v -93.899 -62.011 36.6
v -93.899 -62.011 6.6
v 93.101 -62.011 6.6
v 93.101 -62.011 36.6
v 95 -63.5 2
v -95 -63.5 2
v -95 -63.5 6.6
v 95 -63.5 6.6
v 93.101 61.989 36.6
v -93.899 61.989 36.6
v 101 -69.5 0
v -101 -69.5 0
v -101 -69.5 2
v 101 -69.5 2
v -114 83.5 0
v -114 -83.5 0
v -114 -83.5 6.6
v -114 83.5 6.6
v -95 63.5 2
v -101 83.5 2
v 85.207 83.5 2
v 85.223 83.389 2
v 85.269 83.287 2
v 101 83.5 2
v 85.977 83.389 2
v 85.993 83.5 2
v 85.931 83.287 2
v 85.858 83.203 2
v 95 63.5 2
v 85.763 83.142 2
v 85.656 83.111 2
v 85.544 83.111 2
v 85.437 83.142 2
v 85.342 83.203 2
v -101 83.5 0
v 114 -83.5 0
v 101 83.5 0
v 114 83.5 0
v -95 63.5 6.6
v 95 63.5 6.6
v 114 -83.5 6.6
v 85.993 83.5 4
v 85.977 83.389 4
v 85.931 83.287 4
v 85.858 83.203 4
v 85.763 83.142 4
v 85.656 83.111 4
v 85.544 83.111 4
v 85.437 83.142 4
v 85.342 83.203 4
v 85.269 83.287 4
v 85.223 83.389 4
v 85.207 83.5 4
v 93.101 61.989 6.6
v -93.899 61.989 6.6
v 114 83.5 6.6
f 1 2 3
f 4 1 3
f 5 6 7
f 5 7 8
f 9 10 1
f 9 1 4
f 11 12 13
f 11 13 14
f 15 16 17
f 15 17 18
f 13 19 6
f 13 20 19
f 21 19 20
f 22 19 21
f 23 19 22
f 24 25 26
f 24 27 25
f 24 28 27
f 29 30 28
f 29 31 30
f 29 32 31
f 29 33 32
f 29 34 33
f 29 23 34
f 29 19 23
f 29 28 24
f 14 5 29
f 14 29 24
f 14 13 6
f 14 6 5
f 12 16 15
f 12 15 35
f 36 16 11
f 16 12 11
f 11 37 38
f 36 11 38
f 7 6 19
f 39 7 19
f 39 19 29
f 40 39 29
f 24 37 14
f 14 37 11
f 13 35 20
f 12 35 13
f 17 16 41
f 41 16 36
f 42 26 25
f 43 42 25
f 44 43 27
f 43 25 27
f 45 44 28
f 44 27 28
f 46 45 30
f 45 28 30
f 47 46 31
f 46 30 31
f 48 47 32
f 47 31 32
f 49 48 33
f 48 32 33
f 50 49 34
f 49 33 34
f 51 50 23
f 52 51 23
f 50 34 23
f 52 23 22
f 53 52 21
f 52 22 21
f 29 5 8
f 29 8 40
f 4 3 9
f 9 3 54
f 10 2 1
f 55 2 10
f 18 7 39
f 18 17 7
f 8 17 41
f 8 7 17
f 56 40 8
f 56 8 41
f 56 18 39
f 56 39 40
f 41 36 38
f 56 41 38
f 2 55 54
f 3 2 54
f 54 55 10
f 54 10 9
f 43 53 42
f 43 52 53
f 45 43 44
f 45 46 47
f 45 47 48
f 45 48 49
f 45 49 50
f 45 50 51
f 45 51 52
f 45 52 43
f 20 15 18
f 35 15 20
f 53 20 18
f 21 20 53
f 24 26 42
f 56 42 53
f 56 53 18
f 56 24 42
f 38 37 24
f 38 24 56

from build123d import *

# Parameters (mm, degrees)
F0_W     = 228
F0_H     = 167
F0_W_2   = 190
F0_H_2   = 127
F1_DEPTH = 6.6
F2_W     = 202
F2_H     = 153
F3_DEPTH = 2
F4_R     = 0.393392
F5_DEPTH = 2
F7_W     = 187
F7_H     = 124
F8_DEPTH = 30


with BuildPart() as f1:
    # F0 (on Top) → F1 (new body)
    with BuildSketch(Plane.XY):
        Rectangle(F0_W, F0_H)
        Rectangle(F0_W_2, F0_H_2, mode=Mode.SUBTRACT)
    extrude(amount=F1_DEPTH)

    # F2 (on face) → F3 (cut)
    with BuildSketch(Plane(origin=(0, 0, 0), x_dir=(1, 0, 0), z_dir=(0, 0, -1))):
        with Locations((0, -7)):
            Rectangle(F2_W, F2_H)
    extrude(amount=-F3_DEPTH, mode=Mode.SUBTRACT)

    # F4 (on face) → F5 (cut)
    with BuildSketch(Plane(origin=(0, 0, 2), x_dir=(1, 0, 0), z_dir=(0, 0, -1))):
        with Locations((85.6, -83.5)):
            Circle(F4_R)
    extrude(amount=-F5_DEPTH, mode=Mode.SUBTRACT)


with BuildPart() as f8:
    # F7 (on face) → F8 (new body)
    with BuildSketch(Plane.XY.offset(6.6)):
        with Locations((-0.398763, -0.011258)):
            Rectangle(F7_W, F7_H)
    extrude(amount=F8_DEPTH)


solid = Compound([f1.part, f8.part])
